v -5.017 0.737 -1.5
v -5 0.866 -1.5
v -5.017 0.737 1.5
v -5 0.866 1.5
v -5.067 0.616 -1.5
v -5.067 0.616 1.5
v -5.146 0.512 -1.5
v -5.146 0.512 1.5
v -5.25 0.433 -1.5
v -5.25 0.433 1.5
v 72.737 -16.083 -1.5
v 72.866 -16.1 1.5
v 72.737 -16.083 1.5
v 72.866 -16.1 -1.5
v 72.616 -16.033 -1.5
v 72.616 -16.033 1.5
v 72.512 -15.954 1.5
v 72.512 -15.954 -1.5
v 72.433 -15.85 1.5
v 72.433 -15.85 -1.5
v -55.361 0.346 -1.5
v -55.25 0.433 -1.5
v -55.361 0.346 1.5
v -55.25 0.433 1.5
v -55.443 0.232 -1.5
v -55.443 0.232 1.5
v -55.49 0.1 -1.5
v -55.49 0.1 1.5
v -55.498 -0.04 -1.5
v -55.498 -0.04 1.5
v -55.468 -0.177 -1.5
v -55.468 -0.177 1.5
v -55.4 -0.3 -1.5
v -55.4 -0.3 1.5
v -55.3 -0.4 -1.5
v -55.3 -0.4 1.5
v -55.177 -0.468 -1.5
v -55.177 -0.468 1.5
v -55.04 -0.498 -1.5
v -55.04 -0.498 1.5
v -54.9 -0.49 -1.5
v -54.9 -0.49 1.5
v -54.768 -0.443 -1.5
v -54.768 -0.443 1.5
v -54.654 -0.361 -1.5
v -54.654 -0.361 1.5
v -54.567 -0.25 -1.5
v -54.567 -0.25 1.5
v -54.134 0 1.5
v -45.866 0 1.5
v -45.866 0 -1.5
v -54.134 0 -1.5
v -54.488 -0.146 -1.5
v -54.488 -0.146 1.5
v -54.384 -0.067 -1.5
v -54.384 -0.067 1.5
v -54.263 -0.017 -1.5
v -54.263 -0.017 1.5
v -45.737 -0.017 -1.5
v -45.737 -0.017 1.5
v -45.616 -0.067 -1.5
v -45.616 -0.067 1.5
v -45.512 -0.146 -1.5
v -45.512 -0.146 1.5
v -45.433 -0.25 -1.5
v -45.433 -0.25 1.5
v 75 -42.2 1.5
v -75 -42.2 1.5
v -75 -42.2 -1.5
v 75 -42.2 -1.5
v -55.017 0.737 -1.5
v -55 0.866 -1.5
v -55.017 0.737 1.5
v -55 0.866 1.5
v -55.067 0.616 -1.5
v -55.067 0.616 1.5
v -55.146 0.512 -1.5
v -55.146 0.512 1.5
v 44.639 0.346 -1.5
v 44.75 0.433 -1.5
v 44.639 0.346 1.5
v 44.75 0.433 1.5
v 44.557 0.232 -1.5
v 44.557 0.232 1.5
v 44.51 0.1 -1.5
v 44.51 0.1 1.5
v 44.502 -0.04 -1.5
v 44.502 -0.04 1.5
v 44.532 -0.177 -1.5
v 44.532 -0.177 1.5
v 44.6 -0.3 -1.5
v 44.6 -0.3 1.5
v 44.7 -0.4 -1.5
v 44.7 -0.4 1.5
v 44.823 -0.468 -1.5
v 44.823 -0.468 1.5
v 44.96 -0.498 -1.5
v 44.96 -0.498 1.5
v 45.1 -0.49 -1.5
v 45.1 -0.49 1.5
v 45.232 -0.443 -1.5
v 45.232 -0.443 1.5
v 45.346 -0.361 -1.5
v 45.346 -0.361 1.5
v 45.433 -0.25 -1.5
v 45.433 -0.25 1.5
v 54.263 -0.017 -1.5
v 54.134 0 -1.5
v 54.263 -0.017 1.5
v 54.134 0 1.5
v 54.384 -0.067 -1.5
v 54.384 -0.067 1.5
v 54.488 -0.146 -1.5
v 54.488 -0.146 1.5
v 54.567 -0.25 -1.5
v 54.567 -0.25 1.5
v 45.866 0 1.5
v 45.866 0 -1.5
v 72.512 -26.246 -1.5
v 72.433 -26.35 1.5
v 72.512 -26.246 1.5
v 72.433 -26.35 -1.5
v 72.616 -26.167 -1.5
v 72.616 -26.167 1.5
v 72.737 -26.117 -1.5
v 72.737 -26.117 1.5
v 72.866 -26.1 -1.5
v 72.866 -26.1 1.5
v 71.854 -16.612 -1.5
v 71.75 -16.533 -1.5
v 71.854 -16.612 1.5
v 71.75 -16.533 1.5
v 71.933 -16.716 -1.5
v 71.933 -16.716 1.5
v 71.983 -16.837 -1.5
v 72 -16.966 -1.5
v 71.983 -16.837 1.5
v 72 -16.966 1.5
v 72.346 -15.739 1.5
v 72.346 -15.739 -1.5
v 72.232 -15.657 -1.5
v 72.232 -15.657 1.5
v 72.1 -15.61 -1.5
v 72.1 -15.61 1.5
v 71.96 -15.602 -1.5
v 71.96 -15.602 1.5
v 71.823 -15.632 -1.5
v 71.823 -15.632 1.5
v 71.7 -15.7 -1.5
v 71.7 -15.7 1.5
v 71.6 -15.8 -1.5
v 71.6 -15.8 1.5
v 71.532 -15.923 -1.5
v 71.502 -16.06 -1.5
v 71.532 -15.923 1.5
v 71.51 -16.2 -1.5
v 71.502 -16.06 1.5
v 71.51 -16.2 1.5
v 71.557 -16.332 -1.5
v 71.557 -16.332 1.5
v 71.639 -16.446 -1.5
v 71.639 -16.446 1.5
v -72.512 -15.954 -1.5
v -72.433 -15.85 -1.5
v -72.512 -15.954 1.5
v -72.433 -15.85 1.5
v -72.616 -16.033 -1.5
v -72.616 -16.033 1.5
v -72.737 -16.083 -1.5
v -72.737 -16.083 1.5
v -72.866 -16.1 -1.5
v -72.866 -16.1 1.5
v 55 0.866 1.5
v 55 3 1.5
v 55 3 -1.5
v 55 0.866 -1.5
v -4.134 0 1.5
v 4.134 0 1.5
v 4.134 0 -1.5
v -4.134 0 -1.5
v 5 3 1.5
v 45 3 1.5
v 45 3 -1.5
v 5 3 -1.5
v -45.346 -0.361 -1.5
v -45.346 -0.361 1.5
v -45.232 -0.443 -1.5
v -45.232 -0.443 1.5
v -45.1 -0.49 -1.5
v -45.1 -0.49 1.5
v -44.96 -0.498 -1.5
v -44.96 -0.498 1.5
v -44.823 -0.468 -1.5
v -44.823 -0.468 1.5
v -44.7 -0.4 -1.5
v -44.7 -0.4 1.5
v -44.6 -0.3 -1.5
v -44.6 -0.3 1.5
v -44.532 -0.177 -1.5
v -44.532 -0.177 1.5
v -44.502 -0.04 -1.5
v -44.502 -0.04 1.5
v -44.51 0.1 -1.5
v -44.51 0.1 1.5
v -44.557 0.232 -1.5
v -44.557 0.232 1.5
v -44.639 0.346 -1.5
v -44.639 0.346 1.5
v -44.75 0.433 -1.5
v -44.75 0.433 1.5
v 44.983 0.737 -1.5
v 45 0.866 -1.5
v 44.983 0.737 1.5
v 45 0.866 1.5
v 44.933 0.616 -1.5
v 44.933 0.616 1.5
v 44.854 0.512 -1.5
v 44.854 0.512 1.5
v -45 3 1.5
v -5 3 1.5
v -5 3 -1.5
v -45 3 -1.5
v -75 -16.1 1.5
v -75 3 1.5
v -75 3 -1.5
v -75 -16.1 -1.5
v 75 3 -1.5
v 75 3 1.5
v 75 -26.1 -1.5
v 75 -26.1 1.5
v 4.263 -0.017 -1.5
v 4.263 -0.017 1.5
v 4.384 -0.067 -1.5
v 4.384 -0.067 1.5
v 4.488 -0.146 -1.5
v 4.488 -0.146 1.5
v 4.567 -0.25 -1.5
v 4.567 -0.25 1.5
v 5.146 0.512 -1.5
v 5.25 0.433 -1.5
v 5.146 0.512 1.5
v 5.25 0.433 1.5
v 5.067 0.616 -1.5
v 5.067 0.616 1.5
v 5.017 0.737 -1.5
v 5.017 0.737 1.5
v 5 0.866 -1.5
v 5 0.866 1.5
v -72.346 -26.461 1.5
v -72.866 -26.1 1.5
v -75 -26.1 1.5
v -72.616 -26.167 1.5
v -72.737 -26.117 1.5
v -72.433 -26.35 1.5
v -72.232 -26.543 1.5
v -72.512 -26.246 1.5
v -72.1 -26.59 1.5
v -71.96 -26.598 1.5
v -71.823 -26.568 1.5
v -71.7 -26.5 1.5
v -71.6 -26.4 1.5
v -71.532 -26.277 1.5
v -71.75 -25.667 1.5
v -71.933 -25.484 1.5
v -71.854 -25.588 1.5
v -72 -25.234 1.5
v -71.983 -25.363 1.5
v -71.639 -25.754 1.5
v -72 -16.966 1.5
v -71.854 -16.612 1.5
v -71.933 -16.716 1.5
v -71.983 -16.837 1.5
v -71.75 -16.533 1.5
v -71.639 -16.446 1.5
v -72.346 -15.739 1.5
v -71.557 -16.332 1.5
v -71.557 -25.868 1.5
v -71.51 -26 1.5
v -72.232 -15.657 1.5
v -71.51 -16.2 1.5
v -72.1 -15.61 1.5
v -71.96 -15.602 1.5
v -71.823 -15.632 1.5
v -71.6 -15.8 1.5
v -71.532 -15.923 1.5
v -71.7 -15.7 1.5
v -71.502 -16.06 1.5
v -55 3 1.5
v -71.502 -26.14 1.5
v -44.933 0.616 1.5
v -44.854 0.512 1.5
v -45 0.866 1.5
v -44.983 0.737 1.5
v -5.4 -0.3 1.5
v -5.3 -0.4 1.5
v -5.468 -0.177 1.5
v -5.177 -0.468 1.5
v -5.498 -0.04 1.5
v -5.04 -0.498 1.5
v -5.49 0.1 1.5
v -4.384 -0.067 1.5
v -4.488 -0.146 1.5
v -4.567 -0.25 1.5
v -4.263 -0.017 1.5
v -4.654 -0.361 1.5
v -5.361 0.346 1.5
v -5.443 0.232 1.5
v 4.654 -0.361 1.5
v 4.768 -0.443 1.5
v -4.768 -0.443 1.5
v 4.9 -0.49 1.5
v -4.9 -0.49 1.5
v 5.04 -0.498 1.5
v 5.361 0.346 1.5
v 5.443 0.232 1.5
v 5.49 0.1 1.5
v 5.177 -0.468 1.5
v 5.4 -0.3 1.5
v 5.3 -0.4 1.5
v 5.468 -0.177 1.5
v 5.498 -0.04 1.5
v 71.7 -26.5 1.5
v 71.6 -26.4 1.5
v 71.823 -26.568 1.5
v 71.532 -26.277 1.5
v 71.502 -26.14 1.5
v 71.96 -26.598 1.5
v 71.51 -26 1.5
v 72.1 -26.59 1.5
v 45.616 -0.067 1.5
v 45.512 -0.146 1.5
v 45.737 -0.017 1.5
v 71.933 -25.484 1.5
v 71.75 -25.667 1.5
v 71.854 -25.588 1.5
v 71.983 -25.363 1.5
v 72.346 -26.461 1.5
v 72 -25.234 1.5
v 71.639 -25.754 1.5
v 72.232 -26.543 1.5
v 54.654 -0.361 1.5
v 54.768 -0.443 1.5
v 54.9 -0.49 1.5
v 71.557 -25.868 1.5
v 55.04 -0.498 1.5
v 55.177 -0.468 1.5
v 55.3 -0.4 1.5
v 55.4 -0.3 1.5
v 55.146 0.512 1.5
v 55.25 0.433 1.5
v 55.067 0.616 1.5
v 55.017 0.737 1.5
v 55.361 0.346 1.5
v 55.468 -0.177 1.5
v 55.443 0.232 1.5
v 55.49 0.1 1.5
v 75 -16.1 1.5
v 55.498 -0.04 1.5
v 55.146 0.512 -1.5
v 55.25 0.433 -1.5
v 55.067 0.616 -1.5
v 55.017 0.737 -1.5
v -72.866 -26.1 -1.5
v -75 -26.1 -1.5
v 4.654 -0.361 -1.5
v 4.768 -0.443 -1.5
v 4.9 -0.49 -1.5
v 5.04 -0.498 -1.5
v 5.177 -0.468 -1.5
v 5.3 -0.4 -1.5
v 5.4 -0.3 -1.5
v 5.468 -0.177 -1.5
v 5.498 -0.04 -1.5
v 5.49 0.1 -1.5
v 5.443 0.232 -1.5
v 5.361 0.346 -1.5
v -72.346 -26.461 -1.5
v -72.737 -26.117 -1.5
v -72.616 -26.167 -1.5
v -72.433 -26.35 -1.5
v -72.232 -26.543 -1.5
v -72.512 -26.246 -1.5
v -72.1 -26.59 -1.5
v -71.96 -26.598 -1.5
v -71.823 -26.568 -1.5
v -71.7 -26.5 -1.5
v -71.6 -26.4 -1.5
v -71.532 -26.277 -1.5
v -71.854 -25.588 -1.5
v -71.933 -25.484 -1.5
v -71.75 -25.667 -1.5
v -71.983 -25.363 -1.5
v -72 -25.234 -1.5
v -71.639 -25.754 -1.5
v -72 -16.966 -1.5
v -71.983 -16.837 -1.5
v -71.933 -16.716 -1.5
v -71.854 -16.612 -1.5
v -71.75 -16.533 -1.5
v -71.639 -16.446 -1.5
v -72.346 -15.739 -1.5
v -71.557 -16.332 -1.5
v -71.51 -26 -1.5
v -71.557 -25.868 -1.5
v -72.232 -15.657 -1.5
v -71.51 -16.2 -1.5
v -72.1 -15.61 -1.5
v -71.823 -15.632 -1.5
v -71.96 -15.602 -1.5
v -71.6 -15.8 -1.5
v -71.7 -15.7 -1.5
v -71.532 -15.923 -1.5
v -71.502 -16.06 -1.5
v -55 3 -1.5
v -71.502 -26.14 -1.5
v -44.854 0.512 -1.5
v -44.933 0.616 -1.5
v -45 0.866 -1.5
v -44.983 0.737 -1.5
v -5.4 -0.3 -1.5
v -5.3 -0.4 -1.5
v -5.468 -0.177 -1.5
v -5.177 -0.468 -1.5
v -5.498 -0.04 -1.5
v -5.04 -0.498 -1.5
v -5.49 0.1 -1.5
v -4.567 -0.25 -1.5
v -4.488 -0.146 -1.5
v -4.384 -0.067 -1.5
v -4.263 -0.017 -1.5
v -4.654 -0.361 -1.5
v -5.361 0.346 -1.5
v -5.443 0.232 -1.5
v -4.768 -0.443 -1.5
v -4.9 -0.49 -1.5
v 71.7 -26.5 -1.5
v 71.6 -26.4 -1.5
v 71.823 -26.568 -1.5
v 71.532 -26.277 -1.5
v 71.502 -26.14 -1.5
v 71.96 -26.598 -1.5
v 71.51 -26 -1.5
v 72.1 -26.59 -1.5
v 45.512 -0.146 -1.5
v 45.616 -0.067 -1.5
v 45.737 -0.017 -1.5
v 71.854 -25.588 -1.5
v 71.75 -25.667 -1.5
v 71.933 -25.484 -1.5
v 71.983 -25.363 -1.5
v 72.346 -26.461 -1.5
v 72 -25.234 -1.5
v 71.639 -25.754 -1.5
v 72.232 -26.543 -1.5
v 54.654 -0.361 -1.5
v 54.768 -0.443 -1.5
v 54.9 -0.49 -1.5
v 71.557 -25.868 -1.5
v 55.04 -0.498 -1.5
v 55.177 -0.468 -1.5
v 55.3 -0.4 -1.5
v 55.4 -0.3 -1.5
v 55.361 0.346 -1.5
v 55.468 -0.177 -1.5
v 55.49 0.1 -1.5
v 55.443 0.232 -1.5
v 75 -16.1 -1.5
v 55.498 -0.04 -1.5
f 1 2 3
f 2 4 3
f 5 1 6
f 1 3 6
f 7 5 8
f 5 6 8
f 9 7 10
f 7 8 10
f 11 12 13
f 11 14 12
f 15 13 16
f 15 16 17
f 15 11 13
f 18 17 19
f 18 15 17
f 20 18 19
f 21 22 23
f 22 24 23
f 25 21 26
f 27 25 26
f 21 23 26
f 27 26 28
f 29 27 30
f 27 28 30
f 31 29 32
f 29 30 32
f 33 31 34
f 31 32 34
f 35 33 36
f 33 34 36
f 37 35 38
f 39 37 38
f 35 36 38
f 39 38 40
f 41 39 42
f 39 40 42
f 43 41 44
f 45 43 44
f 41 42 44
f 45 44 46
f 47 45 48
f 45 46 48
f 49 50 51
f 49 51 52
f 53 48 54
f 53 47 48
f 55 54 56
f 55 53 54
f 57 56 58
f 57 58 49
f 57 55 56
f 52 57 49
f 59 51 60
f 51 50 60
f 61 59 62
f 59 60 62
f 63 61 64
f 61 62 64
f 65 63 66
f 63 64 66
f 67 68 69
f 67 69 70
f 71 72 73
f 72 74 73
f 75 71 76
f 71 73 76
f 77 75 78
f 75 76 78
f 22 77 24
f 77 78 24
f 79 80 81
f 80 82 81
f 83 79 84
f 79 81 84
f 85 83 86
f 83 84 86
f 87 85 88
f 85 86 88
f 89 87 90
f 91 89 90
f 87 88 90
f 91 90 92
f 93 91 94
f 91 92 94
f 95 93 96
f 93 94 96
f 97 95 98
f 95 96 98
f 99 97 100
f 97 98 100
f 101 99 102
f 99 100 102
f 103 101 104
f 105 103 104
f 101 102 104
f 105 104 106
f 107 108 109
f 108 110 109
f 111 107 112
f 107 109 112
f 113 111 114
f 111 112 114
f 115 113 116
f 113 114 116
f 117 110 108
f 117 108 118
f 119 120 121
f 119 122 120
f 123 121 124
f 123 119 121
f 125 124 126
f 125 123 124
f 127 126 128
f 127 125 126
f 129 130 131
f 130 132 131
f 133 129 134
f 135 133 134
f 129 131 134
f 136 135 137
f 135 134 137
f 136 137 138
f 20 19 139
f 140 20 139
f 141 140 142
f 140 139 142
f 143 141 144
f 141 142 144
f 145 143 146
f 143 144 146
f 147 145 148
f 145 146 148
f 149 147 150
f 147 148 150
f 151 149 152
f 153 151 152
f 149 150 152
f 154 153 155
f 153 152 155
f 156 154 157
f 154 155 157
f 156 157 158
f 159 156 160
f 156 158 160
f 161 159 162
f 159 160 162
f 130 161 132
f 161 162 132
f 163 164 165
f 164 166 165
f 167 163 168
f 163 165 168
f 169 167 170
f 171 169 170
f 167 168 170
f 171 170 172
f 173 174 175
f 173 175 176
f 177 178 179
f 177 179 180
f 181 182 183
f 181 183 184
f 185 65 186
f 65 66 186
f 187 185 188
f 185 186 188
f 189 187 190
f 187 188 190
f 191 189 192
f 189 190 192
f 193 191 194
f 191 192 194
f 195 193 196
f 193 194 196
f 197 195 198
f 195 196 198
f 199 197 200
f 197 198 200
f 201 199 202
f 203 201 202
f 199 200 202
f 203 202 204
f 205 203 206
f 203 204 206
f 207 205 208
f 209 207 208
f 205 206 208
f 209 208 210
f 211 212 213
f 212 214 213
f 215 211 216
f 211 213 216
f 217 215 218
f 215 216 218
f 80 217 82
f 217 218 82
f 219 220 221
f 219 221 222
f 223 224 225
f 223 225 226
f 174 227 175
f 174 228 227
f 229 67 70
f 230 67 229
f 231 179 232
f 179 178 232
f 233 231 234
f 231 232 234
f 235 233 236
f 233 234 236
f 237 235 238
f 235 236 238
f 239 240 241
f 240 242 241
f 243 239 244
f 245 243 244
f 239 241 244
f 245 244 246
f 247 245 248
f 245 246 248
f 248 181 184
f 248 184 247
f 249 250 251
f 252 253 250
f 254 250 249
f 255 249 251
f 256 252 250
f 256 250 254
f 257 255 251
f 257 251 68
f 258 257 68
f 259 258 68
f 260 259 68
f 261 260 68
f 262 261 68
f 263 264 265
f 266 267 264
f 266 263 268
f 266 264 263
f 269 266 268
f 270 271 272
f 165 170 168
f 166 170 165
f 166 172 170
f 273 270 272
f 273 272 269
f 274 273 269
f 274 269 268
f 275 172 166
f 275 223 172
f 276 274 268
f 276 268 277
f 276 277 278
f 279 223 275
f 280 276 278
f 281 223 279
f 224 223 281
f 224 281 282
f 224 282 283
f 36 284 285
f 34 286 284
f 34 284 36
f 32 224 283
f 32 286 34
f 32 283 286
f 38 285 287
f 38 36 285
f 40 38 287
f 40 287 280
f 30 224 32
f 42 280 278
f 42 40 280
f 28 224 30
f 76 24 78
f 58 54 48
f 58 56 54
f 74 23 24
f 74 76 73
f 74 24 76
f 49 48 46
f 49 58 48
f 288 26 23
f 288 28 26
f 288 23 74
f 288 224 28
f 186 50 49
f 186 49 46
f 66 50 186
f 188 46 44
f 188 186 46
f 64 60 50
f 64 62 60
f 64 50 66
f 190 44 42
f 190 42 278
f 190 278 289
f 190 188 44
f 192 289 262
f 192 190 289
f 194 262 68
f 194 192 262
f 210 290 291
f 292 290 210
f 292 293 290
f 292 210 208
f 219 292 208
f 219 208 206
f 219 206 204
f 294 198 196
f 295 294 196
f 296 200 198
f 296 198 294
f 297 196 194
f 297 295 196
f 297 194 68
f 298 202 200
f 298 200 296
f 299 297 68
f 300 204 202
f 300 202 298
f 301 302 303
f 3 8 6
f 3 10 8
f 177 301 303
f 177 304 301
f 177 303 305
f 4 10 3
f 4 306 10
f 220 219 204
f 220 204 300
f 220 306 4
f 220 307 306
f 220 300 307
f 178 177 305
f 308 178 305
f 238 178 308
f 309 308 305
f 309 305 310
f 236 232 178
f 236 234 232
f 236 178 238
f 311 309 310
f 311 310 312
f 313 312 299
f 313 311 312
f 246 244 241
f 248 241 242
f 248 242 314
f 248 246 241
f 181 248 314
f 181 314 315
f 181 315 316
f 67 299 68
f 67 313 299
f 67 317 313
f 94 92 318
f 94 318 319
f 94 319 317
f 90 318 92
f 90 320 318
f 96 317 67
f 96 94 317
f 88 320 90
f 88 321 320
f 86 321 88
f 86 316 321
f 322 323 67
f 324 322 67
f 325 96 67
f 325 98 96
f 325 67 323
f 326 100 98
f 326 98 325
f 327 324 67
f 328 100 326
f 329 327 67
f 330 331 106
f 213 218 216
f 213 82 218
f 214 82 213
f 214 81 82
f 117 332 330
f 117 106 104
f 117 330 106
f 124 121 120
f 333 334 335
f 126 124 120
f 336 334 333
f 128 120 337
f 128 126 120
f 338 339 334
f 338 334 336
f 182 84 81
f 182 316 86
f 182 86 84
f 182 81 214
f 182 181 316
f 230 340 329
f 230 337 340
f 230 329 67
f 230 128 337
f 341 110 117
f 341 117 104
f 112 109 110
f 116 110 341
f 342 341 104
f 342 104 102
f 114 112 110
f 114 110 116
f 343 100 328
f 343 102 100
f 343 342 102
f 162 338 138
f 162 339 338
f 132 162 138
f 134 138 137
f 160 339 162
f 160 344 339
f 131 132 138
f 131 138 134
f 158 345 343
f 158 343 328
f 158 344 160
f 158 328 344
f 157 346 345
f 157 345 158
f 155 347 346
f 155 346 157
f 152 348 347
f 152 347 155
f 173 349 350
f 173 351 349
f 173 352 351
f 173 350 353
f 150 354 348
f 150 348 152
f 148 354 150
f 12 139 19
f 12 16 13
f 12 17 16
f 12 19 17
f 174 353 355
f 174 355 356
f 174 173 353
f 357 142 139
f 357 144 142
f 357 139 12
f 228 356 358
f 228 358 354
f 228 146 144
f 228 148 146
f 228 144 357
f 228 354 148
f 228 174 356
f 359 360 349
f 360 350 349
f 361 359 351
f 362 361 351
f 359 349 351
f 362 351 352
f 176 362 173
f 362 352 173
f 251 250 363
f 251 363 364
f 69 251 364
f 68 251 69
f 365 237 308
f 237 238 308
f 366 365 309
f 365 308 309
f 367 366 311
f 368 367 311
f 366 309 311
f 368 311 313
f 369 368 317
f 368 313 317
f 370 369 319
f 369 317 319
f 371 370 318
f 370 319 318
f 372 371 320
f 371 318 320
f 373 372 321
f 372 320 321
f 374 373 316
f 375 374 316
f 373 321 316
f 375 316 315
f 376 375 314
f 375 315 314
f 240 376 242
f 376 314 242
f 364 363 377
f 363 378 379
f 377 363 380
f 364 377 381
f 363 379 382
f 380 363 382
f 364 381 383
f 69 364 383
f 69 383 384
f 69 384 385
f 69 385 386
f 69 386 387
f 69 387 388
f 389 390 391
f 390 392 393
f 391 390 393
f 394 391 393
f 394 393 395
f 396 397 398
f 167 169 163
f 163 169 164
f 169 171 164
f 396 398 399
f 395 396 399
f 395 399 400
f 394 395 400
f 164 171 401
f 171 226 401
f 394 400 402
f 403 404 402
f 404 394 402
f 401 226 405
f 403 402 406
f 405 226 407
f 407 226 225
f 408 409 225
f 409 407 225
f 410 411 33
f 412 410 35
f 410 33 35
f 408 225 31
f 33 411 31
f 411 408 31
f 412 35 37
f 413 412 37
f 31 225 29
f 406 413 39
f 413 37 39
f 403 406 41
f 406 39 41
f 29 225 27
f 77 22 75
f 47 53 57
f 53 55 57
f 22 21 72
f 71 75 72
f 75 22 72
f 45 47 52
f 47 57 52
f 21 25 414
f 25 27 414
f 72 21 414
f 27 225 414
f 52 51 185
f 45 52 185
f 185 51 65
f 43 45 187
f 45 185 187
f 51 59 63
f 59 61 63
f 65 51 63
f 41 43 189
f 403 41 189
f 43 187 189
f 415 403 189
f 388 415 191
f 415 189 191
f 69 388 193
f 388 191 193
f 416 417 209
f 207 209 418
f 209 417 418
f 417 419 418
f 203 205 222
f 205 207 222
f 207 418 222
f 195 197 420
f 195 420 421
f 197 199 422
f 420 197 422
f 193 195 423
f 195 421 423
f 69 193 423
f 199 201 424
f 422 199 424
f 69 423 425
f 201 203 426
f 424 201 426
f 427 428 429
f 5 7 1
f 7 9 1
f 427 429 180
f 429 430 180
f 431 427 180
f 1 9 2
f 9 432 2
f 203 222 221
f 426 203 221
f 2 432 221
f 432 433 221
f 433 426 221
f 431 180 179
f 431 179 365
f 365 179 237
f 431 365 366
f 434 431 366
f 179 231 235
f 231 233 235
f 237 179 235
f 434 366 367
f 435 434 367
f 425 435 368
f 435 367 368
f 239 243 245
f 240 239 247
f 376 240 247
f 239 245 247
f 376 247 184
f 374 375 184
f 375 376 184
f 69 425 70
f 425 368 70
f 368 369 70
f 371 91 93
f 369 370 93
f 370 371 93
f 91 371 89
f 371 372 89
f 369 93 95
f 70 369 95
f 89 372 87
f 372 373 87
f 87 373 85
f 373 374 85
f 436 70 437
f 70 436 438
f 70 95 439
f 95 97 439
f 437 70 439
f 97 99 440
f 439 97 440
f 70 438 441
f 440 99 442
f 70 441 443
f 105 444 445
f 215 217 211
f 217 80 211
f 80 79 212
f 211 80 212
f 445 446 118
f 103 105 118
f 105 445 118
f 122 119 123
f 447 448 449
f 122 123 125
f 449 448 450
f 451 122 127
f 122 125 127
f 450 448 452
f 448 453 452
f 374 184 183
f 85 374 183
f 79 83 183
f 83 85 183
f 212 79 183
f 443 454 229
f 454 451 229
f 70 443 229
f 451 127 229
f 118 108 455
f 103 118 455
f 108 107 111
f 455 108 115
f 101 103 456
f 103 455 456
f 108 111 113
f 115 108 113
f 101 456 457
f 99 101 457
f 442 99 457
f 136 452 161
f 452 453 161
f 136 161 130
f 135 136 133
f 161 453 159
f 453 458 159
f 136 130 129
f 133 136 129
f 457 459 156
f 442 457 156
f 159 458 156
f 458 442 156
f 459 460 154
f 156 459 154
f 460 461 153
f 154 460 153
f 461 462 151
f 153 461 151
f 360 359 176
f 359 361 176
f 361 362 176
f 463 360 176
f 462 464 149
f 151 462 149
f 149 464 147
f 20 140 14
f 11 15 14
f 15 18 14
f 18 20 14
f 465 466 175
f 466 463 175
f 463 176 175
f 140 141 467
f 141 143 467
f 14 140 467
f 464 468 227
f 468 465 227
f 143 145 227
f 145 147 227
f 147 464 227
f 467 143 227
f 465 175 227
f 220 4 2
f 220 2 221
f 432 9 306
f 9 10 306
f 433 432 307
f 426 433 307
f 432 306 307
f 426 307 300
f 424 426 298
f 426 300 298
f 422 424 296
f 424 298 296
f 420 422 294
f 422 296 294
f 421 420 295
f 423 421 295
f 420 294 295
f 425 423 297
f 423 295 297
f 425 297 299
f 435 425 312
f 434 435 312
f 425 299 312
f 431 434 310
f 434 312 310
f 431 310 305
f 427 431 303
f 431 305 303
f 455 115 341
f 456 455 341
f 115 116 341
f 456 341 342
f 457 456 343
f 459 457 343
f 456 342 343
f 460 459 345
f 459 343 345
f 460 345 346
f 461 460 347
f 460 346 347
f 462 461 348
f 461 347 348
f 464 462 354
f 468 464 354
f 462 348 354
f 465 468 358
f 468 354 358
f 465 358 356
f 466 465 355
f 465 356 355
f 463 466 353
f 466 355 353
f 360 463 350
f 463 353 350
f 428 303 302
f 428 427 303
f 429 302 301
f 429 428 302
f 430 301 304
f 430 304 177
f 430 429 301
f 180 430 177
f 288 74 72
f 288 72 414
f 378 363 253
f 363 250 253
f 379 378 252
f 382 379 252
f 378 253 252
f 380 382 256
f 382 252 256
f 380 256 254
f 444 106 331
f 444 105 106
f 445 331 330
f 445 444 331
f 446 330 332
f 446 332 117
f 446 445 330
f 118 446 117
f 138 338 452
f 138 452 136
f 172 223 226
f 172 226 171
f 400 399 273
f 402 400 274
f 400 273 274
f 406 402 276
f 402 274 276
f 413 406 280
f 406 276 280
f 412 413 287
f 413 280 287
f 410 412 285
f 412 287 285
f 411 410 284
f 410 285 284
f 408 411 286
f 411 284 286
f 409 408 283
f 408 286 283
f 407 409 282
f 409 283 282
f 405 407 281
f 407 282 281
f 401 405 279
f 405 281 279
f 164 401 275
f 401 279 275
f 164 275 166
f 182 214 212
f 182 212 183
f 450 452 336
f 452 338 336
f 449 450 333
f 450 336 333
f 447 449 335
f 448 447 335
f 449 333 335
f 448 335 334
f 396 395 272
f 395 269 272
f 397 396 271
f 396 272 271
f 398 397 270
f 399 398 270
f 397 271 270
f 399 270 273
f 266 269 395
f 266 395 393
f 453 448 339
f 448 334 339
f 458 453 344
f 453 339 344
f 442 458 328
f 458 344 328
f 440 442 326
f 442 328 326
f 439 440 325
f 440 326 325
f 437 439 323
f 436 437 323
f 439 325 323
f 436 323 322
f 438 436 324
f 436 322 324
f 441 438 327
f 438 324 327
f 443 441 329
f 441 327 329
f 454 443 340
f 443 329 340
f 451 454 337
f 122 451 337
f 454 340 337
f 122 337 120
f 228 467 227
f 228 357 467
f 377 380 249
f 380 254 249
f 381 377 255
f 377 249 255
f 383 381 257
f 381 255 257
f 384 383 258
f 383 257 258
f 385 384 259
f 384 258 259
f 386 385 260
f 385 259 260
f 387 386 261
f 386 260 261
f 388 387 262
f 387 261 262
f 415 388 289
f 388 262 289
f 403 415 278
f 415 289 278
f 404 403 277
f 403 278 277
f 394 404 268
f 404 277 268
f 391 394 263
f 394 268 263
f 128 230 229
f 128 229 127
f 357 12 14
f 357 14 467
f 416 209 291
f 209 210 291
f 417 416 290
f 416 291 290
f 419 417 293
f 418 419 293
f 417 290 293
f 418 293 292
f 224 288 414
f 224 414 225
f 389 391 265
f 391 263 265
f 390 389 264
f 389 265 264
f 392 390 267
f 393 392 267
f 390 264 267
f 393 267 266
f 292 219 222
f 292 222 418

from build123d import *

# Parameters (mm, degrees)
BOSS_EXTRUDE1_DEPTH = 1.5
SKETCH2_R           = 0.5
CUT_EXTRUDE1_DEPTH  = 87.109465217
FILLET1_R           = 0.5


with BuildPart() as part:
    # Sketch1 → Boss-Extrude1 (new, symmetric)
    with BuildSketch(Plane.XY):
        Polygon((75, 3), (55, 3), (55, 0), (45, 0), (45, 3), (5, 3), (5, 0), (-5, 0), (-5, 3), (-45, 3), (-45, 0), (-55, 0), (-55, 3), (-75, 3), (-75, -16.1), (-72, -16.1), (-72, -26.1), (-75, -26.1), (-75, -42.2), (75, -42.2), (75, -26.1), (72, -26.1), (72, -16.1), (75, -16.1), align=None)
    extrude(amount=BOSS_EXTRUDE1_DEPTH, both=True)

    # Sketch2 → Cut-Extrude1 (cut, through all)
    with BuildSketch(Plane.XY.offset(1.5)):
        with Locations((-55, 0)):
            Circle(SKETCH2_R)
        with Locations((-45, 0)):
            Circle(SKETCH2_R)
        with Locations((-5, 0)):
            Circle(SKETCH2_R)
        with Locations((5, 0)):
            Circle(SKETCH2_R)
        with Locations((45, 0)):
            Circle(SKETCH2_R)
        with Locations((55, 0)):
            Circle(SKETCH2_R)
        with Locations((72, -16.1)):
            Circle(SKETCH2_R)
        with Locations((72, -26.1)):
            Circle(SKETCH2_R)
        with Locations((-72, -26.1)):
            Circle(SKETCH2_R)
        with Locations((-72, -16.1)):
            Circle(SKETCH2_R)
    extrude(amount=-CUT_EXTRUDE1_DEPTH, mode=Mode.SUBTRACT)

    # Fillet1
    fillet1_edges = [part.edges().sort_by_distance(p)[0] for p in [
        (-72, -25.6, 0),
        (-72.5, -26.1, 0),
        (72.5, -26.1, 0),
        (72, -25.6, 0),
        (72, -16.6, 0),
        (72.5, -16.1, 0),
        (55, 0.5, 0),
        (54.5, 0, 0),
        (45.5, 0, 0),
        (45, 0.5, 0),
        (5, 0.5, 0),
        (4.5, 0, 0),
        (-4.5, 0, 0),
        (-5, 0.5, 0),
        (-45, 0.5, 0),
        (-45.5, 0, 0),
        (-72.5, -16.1, 0),
        (-72, -16.6, 0),
        (-54.5, 0, 0),
        (-55, 0.5, 0),
    ]]
    fillet(fillet1_edges, radius=FILLET1_R)


solid = part.part
